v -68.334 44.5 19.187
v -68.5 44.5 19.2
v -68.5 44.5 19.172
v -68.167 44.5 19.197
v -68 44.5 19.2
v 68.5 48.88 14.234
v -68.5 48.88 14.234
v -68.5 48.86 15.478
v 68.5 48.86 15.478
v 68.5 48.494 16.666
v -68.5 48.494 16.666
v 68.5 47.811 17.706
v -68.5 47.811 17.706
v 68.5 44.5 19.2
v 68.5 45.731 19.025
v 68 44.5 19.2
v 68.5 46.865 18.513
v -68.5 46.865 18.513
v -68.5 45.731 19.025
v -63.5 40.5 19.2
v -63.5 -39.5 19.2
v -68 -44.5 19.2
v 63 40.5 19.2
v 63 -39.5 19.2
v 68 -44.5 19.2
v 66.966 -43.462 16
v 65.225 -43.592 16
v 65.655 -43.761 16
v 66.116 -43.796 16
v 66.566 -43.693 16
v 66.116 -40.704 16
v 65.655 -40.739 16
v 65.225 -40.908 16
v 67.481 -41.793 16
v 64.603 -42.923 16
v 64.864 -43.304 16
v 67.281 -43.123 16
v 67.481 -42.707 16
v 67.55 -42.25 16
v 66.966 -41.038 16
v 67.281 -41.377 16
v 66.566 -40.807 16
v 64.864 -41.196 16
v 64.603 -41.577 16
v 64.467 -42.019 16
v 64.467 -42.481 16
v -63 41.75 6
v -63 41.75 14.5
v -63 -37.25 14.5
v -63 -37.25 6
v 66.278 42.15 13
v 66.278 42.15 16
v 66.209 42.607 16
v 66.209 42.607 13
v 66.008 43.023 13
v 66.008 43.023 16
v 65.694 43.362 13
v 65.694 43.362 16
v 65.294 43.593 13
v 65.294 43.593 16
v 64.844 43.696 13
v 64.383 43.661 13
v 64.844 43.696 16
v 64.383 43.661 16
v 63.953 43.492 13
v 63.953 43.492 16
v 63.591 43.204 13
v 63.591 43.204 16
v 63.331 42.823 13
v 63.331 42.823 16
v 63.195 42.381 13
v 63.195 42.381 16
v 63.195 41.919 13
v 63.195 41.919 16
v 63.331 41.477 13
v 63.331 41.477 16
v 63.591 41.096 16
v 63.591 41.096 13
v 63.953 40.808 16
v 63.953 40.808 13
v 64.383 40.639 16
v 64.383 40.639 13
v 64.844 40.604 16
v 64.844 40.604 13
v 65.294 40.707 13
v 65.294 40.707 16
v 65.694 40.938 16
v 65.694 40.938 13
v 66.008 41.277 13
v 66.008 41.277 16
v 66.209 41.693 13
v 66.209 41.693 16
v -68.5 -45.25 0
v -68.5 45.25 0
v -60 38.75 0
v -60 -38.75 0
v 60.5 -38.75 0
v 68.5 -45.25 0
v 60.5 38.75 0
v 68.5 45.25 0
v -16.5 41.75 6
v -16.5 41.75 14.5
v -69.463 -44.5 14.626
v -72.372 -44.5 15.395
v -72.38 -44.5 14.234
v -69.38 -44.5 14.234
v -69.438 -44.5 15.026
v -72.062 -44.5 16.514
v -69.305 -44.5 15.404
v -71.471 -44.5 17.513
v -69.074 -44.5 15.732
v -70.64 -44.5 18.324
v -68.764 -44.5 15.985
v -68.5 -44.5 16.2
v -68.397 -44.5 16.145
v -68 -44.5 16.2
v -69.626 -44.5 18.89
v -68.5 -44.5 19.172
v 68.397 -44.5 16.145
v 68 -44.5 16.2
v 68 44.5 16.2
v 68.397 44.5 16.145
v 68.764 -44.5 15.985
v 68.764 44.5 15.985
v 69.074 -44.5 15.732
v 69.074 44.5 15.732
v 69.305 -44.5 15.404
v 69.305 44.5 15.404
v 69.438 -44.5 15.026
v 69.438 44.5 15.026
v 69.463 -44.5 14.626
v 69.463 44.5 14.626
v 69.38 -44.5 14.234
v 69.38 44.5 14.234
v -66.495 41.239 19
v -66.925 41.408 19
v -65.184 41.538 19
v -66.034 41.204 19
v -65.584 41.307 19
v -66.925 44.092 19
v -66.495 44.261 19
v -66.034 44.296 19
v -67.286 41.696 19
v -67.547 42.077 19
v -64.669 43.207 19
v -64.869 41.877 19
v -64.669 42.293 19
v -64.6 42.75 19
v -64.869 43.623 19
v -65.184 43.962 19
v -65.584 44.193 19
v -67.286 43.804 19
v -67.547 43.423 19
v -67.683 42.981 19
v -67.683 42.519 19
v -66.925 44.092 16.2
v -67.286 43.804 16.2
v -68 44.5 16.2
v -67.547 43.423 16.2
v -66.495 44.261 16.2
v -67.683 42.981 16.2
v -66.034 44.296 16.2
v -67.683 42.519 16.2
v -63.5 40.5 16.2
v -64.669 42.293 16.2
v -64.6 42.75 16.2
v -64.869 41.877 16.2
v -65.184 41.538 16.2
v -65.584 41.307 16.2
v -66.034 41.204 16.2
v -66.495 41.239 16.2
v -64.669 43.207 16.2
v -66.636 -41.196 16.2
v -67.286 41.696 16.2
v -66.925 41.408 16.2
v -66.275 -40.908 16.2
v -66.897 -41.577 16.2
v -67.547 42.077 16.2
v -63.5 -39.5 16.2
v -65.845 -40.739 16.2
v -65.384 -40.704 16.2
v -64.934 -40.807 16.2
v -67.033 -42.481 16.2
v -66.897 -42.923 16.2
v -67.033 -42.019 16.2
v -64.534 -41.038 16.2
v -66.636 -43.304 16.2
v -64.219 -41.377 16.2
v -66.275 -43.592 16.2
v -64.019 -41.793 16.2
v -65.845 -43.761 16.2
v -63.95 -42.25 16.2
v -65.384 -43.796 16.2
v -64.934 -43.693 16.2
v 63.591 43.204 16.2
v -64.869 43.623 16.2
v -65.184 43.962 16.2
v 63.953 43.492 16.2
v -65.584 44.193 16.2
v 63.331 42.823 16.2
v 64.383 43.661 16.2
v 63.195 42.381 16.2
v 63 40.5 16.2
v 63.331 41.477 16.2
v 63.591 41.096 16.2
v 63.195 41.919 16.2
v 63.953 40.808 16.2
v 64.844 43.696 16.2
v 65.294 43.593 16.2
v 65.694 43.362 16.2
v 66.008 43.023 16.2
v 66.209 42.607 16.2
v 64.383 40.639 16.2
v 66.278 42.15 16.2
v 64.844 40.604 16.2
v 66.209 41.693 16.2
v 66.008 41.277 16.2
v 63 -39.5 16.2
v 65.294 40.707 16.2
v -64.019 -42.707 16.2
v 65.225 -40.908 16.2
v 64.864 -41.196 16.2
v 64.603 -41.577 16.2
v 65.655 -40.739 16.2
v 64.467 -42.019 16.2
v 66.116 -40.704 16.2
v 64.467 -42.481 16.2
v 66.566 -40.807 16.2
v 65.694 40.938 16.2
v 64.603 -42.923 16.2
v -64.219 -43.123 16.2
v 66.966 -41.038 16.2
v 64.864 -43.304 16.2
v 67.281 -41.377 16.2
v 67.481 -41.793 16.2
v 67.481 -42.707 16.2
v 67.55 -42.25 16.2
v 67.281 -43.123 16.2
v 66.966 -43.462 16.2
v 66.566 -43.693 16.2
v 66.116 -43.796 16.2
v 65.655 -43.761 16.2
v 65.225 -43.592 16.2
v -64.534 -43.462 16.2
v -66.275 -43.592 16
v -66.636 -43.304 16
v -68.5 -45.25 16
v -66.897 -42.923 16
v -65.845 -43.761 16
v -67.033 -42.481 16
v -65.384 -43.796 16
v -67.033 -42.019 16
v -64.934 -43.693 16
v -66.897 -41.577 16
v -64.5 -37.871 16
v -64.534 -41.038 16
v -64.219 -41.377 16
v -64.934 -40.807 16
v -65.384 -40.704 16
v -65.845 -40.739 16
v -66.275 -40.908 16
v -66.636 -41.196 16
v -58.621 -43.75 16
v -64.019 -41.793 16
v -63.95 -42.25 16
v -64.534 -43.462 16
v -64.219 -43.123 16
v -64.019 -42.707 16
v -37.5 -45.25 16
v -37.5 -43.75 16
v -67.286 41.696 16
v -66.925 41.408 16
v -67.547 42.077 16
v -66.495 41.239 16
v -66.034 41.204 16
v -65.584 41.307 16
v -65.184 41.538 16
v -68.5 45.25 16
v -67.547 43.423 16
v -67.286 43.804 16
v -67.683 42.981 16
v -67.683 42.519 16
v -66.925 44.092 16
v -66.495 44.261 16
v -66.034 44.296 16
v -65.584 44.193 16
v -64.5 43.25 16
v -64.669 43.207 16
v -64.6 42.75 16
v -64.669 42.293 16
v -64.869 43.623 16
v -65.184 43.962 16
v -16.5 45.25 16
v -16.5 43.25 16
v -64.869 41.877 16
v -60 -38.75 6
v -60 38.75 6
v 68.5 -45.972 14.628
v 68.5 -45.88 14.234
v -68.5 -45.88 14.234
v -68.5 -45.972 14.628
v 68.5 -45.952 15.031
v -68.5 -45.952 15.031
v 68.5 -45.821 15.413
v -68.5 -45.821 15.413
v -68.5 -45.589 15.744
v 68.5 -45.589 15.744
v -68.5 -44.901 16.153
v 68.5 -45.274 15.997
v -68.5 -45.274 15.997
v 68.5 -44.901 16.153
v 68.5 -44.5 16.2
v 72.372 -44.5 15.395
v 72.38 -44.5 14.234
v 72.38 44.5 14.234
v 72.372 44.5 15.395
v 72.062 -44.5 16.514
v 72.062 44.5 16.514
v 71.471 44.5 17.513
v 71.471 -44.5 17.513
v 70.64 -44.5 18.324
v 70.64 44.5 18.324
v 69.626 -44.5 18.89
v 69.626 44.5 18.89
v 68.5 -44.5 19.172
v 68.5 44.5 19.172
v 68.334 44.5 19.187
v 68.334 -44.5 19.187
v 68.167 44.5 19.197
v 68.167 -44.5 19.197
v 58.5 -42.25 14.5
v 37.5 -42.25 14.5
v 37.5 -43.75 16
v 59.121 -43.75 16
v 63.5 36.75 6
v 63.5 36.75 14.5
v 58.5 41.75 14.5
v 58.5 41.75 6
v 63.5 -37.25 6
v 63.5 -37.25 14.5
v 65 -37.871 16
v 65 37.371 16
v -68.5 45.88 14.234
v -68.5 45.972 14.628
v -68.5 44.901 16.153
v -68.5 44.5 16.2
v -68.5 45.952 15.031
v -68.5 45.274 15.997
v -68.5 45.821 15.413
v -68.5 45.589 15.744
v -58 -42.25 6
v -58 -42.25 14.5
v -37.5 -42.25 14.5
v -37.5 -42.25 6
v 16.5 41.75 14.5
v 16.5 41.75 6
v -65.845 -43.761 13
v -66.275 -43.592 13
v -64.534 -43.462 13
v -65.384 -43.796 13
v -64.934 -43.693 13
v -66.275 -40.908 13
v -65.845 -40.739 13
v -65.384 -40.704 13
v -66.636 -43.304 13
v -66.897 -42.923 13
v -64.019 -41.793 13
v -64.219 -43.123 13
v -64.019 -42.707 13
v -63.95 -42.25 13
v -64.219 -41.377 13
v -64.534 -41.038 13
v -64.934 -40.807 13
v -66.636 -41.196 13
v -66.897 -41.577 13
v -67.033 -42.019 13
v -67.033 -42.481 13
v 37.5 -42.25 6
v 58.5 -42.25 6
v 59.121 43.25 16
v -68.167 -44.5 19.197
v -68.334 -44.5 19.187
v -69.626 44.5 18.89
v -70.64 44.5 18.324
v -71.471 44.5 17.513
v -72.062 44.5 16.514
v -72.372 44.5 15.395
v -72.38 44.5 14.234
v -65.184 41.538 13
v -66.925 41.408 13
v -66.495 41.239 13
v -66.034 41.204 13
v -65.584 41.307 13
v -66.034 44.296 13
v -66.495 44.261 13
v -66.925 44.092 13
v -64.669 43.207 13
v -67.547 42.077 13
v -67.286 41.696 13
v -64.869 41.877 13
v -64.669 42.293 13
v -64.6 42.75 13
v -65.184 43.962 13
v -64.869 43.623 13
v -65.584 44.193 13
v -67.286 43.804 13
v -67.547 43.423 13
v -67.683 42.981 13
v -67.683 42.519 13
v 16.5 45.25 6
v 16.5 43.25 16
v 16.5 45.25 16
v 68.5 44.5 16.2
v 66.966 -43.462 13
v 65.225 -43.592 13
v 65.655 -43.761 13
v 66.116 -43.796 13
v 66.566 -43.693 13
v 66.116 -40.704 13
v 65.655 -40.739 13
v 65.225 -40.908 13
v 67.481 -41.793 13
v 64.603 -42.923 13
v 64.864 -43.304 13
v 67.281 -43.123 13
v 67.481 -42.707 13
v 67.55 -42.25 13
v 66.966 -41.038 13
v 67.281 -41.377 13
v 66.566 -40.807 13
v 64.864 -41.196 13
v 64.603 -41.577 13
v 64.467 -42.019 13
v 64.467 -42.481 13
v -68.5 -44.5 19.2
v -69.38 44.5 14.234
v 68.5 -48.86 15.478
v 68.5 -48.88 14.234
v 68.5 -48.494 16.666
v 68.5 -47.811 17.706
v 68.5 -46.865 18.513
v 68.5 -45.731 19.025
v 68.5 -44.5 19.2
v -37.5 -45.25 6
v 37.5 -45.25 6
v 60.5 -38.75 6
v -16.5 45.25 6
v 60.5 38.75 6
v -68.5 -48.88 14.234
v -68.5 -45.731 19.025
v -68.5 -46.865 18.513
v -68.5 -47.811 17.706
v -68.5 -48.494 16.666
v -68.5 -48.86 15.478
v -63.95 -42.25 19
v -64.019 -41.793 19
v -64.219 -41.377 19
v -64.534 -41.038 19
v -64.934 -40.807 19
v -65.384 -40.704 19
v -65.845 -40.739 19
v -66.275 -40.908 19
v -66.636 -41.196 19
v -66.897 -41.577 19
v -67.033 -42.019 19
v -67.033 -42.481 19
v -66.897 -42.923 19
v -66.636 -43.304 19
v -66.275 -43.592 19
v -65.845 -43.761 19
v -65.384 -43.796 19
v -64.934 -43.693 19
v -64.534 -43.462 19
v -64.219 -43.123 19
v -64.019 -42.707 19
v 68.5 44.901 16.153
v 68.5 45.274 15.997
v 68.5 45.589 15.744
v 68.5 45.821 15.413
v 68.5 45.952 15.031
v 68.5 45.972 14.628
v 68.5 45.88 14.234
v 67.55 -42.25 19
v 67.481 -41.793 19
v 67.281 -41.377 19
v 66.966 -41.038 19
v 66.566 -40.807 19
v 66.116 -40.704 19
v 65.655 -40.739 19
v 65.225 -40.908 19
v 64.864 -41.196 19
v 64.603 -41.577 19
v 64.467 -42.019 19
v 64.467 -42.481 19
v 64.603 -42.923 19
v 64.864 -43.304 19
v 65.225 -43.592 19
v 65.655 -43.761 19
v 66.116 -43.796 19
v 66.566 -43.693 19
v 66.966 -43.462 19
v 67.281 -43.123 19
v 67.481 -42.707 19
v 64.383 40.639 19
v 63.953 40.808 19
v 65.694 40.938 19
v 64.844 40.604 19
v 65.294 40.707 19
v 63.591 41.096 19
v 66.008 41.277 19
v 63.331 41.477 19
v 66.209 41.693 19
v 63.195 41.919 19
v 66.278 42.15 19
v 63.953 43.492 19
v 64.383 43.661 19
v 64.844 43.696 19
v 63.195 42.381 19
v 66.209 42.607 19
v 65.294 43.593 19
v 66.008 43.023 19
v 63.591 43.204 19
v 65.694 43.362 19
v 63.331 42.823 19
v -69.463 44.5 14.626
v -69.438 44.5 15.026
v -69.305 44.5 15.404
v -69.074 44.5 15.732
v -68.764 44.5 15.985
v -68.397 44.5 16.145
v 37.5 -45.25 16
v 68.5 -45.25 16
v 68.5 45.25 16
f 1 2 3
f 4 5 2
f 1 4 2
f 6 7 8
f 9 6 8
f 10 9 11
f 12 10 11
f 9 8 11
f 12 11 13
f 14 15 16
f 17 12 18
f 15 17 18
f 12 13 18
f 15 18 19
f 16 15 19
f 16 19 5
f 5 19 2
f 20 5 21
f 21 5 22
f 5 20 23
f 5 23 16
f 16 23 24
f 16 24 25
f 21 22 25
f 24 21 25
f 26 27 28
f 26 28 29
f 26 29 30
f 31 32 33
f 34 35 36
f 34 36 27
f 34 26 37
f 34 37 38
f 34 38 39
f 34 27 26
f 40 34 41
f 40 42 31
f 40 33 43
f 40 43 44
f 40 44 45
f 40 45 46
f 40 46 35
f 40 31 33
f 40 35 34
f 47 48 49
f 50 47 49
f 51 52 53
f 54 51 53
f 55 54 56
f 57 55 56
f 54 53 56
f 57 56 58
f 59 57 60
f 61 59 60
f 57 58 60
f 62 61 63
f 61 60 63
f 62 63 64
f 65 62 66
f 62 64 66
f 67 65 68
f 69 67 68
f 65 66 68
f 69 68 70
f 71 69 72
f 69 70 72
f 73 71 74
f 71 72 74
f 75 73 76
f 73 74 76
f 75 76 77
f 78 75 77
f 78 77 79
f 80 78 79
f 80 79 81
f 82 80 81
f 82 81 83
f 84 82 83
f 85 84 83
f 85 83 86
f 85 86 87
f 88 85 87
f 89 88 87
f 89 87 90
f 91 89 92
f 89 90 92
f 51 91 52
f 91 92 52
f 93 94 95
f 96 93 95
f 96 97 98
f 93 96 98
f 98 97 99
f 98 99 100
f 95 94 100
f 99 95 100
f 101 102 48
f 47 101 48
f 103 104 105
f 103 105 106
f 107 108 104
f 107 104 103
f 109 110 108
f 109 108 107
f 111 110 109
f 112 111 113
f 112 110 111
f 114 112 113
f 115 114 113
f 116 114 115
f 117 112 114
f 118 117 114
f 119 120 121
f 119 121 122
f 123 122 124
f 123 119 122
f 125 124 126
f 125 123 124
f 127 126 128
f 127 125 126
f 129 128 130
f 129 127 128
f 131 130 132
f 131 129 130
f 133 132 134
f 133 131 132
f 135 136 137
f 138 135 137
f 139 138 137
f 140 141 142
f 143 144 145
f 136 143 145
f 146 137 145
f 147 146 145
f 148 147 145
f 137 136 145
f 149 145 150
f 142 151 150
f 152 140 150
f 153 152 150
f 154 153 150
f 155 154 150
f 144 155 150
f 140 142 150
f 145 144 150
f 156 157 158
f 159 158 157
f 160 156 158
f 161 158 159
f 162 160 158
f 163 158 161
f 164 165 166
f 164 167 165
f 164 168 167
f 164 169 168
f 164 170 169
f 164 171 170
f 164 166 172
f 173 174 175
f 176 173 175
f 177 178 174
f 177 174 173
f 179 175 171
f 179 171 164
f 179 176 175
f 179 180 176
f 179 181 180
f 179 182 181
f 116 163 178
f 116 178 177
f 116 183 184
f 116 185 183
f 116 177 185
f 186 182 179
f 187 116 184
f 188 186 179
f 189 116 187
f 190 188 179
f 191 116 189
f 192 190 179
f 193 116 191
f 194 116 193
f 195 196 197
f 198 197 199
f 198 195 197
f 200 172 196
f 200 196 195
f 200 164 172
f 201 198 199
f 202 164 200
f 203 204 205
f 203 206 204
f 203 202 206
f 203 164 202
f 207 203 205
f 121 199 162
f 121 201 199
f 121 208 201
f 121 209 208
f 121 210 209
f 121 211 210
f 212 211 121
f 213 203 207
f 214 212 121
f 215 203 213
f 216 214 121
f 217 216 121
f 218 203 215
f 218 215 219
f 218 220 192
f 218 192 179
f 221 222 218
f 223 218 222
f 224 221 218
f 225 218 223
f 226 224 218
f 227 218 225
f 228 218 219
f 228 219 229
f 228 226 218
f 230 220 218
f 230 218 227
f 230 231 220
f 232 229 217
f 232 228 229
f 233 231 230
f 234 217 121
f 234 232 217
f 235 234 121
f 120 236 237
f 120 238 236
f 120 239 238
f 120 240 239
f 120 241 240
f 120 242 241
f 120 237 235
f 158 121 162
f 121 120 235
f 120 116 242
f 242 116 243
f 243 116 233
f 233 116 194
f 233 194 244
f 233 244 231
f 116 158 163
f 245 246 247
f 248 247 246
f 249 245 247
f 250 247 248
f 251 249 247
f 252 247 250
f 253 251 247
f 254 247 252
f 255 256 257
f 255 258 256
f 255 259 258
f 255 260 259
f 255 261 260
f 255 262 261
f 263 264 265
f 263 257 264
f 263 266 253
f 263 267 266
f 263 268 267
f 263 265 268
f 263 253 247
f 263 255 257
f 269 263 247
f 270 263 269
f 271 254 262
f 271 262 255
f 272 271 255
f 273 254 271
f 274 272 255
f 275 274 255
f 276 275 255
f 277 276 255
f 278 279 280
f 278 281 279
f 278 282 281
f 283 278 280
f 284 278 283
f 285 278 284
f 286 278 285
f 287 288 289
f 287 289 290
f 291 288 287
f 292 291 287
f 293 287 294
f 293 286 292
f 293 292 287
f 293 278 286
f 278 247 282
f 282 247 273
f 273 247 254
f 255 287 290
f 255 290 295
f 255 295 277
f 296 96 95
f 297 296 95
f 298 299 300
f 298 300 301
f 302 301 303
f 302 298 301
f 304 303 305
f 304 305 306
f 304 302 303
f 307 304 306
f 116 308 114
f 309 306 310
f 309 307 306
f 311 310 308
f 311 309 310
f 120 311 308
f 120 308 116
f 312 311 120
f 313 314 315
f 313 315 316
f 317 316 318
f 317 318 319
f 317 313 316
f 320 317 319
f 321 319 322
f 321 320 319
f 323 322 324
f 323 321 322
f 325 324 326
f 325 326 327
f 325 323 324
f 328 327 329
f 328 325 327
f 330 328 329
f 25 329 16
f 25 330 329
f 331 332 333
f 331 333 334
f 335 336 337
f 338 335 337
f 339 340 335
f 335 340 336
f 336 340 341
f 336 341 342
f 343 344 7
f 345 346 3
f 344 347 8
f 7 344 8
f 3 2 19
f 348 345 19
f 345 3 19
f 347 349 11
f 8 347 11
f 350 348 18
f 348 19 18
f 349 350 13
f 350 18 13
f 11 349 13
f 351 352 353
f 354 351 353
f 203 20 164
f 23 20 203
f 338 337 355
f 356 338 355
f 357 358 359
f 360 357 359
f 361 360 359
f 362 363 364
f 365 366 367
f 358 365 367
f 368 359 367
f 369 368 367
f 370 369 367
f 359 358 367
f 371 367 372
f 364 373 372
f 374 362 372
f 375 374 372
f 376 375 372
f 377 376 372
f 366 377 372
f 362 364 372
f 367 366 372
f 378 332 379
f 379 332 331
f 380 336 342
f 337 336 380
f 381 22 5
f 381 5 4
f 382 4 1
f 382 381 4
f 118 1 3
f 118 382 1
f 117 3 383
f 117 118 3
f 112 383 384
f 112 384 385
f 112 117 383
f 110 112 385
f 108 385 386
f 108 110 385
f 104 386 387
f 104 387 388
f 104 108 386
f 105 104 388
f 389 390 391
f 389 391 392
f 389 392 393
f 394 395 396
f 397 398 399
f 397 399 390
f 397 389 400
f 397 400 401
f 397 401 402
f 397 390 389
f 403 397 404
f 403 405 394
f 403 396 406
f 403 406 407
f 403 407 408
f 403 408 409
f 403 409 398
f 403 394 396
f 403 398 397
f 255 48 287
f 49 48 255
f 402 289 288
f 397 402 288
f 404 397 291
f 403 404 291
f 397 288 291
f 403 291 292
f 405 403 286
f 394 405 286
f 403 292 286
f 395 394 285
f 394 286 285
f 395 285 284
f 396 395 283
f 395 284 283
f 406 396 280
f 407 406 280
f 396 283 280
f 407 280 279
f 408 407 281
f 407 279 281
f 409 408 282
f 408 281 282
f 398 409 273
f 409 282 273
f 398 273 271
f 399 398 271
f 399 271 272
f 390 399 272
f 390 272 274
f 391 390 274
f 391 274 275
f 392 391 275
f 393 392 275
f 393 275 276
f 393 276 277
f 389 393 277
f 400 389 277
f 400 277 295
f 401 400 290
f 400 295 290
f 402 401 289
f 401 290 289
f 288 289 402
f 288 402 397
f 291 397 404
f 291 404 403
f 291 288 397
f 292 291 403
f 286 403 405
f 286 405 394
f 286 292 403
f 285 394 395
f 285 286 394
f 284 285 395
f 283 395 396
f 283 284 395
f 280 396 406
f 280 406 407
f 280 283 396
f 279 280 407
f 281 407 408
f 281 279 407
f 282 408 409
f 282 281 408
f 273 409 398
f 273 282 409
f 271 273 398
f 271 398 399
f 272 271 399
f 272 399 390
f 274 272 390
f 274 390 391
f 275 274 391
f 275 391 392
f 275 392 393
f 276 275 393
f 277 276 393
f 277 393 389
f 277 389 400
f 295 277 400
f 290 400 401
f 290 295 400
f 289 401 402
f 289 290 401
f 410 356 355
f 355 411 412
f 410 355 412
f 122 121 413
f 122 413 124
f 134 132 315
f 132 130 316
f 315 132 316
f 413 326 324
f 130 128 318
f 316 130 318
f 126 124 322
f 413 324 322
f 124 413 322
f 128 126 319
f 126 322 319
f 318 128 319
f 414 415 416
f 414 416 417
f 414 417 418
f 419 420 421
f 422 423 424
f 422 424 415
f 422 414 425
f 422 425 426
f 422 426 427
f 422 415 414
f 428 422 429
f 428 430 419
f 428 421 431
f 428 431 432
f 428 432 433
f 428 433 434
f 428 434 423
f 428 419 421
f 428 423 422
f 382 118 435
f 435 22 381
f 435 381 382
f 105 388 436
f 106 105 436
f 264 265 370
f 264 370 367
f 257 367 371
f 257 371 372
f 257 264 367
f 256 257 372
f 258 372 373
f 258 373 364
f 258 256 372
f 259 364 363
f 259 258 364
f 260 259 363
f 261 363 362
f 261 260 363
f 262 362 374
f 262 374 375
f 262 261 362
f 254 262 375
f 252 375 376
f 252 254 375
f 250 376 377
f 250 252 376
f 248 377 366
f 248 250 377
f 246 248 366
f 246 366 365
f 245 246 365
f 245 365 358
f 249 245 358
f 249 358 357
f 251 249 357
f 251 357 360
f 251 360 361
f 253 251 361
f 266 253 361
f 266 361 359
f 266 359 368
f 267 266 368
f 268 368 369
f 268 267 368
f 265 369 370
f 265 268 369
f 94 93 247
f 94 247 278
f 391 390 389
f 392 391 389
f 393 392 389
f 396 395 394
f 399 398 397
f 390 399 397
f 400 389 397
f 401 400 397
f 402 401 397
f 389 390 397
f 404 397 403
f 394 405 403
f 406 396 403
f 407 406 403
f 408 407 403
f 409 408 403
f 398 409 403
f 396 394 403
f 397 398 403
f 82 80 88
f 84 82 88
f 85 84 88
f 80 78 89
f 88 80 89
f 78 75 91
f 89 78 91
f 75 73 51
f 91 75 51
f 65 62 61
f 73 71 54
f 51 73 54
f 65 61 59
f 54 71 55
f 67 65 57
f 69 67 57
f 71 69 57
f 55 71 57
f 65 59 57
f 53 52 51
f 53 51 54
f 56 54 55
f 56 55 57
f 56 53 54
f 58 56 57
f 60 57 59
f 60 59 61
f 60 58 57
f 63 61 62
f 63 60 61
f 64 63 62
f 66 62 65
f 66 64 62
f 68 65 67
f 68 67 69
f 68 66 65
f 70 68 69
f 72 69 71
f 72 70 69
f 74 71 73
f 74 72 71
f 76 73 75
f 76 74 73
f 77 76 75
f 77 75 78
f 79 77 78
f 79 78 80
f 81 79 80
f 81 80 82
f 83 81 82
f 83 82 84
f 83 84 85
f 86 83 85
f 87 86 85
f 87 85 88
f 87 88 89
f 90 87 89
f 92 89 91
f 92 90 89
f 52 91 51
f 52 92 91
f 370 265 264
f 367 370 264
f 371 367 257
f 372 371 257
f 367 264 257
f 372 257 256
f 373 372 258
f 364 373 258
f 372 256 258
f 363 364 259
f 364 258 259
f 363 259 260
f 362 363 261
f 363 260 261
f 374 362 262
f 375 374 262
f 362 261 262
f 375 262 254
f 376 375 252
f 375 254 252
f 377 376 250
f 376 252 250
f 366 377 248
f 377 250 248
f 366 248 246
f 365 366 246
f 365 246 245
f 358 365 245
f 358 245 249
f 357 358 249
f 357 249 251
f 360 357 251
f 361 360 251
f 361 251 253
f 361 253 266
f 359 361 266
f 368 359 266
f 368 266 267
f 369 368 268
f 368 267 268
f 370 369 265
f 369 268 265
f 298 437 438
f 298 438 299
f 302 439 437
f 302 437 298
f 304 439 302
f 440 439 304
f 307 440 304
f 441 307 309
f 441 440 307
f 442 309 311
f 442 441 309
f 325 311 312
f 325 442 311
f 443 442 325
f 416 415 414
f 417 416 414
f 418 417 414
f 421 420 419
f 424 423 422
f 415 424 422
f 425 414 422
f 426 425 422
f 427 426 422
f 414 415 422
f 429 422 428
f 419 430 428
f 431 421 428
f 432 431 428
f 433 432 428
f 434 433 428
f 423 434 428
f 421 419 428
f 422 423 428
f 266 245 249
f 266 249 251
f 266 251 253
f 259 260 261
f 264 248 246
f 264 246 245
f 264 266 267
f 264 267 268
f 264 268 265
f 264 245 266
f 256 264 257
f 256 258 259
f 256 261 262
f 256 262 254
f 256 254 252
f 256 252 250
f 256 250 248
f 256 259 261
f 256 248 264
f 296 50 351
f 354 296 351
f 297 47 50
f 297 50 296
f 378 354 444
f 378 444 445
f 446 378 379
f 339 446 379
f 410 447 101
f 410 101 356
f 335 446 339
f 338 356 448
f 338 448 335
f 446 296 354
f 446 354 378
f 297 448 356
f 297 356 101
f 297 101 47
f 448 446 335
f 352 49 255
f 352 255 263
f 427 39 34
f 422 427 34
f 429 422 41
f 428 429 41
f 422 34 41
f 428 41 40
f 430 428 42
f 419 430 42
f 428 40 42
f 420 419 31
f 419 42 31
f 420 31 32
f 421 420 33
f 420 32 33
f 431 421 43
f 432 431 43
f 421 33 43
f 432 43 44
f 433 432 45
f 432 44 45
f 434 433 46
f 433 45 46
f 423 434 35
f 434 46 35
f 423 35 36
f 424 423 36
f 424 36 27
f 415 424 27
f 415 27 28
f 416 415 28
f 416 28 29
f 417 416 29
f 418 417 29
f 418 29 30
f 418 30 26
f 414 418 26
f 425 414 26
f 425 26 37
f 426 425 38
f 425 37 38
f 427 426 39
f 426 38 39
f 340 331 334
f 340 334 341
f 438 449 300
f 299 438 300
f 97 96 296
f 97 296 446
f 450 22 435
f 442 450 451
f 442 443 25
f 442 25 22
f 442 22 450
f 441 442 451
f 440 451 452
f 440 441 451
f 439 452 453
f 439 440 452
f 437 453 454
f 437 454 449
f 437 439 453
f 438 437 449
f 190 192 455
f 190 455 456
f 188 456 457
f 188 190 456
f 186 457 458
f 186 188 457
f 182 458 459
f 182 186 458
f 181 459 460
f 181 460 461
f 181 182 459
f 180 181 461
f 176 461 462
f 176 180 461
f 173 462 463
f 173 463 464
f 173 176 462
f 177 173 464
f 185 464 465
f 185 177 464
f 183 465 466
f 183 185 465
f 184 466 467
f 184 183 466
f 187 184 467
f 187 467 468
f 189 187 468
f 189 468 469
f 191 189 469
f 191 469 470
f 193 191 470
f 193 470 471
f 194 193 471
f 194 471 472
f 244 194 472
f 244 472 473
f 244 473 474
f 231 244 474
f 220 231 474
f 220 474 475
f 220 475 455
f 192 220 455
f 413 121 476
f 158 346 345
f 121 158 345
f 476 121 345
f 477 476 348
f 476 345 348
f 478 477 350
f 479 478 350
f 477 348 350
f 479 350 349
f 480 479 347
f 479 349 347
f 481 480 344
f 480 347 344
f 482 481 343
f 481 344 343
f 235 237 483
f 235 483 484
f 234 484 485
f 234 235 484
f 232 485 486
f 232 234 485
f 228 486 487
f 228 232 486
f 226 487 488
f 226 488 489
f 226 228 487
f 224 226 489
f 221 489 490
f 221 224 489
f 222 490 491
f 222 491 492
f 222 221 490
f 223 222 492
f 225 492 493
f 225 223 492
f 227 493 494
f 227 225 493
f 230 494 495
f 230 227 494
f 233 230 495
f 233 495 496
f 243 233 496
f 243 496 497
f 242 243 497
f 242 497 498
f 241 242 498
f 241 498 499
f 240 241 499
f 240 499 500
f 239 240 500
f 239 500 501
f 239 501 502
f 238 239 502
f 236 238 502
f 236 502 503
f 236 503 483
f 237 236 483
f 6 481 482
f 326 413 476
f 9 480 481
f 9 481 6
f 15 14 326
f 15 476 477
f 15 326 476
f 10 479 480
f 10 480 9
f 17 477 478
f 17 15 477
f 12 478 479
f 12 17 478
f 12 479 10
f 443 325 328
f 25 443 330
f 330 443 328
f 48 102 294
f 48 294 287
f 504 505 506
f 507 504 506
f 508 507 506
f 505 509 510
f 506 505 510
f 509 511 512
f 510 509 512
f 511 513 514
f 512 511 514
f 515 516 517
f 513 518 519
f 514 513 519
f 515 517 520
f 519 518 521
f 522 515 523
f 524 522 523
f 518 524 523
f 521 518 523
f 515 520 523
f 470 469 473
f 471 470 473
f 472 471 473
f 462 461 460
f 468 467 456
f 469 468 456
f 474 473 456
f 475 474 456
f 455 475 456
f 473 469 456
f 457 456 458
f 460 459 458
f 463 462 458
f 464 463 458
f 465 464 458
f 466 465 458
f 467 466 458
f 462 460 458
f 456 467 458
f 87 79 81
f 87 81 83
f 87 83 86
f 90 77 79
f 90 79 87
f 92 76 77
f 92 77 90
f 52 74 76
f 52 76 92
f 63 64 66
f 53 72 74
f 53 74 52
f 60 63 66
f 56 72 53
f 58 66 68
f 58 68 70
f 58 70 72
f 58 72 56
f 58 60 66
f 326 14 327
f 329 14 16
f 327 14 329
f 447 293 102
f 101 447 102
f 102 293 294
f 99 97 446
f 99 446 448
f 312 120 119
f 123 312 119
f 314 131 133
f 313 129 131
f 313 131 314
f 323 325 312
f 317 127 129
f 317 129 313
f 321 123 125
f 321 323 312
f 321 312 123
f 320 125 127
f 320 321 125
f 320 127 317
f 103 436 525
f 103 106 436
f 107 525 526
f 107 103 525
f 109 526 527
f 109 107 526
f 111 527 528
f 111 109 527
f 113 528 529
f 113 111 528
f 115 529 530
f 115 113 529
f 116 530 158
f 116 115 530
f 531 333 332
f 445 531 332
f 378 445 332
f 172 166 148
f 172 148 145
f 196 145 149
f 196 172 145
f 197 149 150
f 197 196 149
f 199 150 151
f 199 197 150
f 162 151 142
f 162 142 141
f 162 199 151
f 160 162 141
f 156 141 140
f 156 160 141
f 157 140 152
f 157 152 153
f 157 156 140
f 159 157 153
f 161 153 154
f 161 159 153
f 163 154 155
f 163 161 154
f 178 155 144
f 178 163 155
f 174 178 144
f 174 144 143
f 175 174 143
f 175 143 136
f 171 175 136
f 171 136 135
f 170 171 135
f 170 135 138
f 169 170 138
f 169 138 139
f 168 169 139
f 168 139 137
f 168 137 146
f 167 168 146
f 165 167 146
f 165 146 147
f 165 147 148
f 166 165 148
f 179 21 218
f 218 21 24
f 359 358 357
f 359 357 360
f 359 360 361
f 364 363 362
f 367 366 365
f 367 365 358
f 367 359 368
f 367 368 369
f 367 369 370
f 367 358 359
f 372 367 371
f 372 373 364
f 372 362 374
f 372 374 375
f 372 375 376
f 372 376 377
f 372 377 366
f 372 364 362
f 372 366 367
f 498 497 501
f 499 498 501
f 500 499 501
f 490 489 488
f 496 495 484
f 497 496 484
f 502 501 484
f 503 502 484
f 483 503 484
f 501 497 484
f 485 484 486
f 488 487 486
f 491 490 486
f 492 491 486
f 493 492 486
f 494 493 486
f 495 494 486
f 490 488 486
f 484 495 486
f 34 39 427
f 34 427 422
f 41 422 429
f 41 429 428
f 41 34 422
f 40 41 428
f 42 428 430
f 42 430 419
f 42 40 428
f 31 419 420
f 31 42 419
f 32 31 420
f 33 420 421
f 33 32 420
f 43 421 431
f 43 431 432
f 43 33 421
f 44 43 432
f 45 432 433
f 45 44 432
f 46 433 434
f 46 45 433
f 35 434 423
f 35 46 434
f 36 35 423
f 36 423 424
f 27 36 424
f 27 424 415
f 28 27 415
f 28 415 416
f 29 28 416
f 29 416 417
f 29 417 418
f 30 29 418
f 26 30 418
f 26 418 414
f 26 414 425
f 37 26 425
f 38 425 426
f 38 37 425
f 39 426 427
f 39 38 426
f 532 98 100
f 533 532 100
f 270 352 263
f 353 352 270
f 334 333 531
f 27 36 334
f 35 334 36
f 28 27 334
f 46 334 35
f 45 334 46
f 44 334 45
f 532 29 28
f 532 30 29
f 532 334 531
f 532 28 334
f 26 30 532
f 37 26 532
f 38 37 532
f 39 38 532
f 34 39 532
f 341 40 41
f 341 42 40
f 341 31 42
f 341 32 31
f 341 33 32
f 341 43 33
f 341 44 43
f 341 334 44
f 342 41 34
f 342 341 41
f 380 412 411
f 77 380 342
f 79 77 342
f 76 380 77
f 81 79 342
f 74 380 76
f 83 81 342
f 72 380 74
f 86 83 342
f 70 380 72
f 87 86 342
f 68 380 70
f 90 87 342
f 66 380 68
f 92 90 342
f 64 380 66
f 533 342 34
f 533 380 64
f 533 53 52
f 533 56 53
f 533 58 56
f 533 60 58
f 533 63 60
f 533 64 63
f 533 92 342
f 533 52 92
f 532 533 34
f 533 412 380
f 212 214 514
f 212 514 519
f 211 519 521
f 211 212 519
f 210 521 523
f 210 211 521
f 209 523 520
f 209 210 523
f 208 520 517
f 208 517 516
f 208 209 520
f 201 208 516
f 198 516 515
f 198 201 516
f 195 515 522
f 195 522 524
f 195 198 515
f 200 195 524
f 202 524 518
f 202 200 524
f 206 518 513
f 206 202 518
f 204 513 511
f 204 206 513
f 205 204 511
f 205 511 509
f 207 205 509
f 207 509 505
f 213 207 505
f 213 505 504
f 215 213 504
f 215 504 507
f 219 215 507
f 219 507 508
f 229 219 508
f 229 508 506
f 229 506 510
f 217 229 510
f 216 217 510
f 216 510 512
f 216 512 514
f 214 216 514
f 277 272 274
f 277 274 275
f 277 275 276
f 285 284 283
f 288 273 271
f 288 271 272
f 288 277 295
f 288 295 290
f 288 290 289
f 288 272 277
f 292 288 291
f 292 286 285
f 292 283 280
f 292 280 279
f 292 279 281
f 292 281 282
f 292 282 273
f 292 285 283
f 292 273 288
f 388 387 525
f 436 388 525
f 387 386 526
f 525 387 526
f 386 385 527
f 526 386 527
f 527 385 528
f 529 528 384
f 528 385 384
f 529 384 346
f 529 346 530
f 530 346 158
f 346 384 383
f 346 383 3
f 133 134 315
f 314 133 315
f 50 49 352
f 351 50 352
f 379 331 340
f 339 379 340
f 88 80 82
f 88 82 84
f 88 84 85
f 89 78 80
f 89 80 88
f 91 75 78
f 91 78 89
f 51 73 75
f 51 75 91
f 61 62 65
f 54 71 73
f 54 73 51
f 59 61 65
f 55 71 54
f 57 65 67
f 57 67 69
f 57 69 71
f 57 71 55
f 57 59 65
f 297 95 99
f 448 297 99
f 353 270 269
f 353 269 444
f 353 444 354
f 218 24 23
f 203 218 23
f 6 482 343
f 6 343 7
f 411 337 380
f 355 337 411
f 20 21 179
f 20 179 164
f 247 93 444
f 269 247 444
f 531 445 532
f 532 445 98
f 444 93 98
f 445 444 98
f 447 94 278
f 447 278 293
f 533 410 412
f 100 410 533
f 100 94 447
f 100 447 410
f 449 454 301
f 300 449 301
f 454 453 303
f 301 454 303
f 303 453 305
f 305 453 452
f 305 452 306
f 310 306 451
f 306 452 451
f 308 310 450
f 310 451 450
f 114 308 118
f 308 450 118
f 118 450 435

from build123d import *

# Parameters (mm, degrees)
F0_W      = 137
F0_H      = 90.5
F0_W_2    = 120.5
F0_H_2    = 77.5
F1_DEPTH  = 16
F3_W      = 33
F3_H      = 39.131847919
F3_H_2    = 13
F3_W_2    = 75
F3_H_3    = 13.5
F3_H_4    = 6.5
F4_DEPTH  = 10
F5_SIZE   = 1.5
F6_R      = 1.55
F7_DEPTH  = 3
F8_DEPTH  = 3
F9_W      = 136
F9_H      = 3
F10_DEPTH = 44.5
F12_DEPTH = 68.5
F13_W     = 126.5
F13_H     = 80
F14_DEPTH = 10
F15_DEPTH = 3


# Not quite as in the source:
# - a feature names something its author has since deleted; it is built from what else it names


with BuildPart() as f1:
    # F0 (on Top) → F1 (new body)
    with BuildSketch(Plane.XY):
        Rectangle(F0_W, F0_H)
        with Locations((0.25, 0)):
            Rectangle(F0_W_2, F0_H_2, mode=Mode.SUBTRACT)
    extrude(amount=F1_DEPTH)

    # F3 (on 3pt) → F4 (cut)
    with BuildSketch(Plane.XY.offset(16)):
        with Locations((0, 61.3159239595)):
            Rectangle(F3_W, F3_H)
        with Locations((0, 35.25)):
            Rectangle(F3_W, F3_H_2)
        Polygon((-16.5, 28.75), (-16.5, 41.75), (-63, 41.75), (-63, -37.25), (-58, -42.25), (-37.5, -42.25), (-37.5, -28.75), (37.5, -28.75), (37.5, -42.25), (58.5, -42.25), (63.5, -37.25), (63.5, 36.75), (58.5, 41.75), (16.5, 41.75), (16.5, 28.75), align=None)
        with Locations((0, -35.5)):
            Rectangle(F3_W_2, F3_H_3)
        with Locations((0, -45.5)):
            Rectangle(F3_W_2, F3_H_4)
    extrude(amount=-F4_DEPTH, mode=Mode.SUBTRACT)

    # F5
    f5_edges = [f1.edges().sort_by_distance(p)[0] for p in [
        (-63, 2.25, 16),
        (-39.75, 41.75, 16),
        (61, 39.25, 16),
        (63.5, -0.25, 16),
        (61, -39.75, 16),
        (-60.5, -39.75, 16),
        (-47.75, -42.25, 16),
        (48, -42.25, 16),
        (37.5, 41.75, 16),
    ]]
    chamfer(f5_edges, length=F5_SIZE)

    # F6 (on face) → F7 (cut)
    with BuildSketch(Plane.XY.offset(16)):
        with Locations((-66.15, 42.75)):
            Circle(F6_R)
        with Locations((-65.5, -42.25)):
            Circle(F6_R)
        with Locations((66, -42.25)):
            Circle(F6_R)
        with Locations((64.7276754423, 42.15)):
            Circle(F6_R)
    extrude(amount=-F7_DEPTH, mode=Mode.SUBTRACT)


with BuildPart() as f8:
    # F6 (on face) → F8 (new body)
    with BuildSketch(Plane.XY.offset(16)):
        with Locations((-66.15, 42.75)):
            Circle(F6_R)
    extrude(amount=-F8_DEPTH)


with BuildPart() as f8b:
    # F6 (on face) → F8, piece 2 (new body)
    with BuildSketch(Plane.XY.offset(16)):
        with Locations((-65.5, -42.25)):
            Circle(F6_R)
    extrude(amount=-F8_DEPTH)


with BuildPart() as f8c:
    # F6 (on face) → F8, piece 3 (new body)
    with BuildSketch(Plane.XY.offset(16)):
        with Locations((66, -42.25)):
            Circle(F6_R)
    extrude(amount=-F8_DEPTH)


with BuildPart() as f8d:
    # F6 (on face) → F8, piece 4 (new body)
    with BuildSketch(Plane.XY.offset(16)):
        with Locations((64.7276754423, 42.15)):
            Circle(F6_R)
    extrude(amount=-F8_DEPTH)


with BuildPart() as f10:
    # F9 (on Front) → F10 (new body, symmetric)
    with BuildSketch(Plane.XZ):
        with Locations((0, 17.7)):
            Rectangle(F9_W, F9_H)
        with BuildLine():
            Line((-68, 16.2), (-68, 19.2))
            ThreePointArc((-68, 19.2), (-71.3106094408, 17.7056160116), (-72.3797211221, 14.2342591319))
            Line((-72.3797211221, 14.2342591319), (-69.3797211221, 14.2342591319))
            ThreePointArc((-69.3797211221, 14.2342591319), (-69.2008088457, 15.575755747), (-68, 16.2))
        make_face()
        with BuildLine():
            ThreePointArc((72.3797211221, 14.2342591319), (71.3106094408, 17.7056160116), (68, 19.2))
            Line((68, 19.2), (68, 16.2))
            ThreePointArc((68, 16.2), (69.2008088457, 15.575755747), (69.3797211221, 14.2342591319))
            Line((69.3797211221, 14.2342591319), (72.3797211221, 14.2342591319))
        make_face()
    extrude(amount=F10_DEPTH, both=True)

    # F11 (on Right) → F12 (join, symmetric)
    with BuildSketch(Plane.YZ):
        with BuildLine():
            ThreePointArc((48.8797211221, 14.2342591319), (47.8106094408, 17.7056160116), (44.5, 19.2))
            Line((44.5, 19.2), (44.5, 16.2))
            ThreePointArc((44.5, 16.2), (45.7165581841, 15.5868099481), (45.8797211221, 14.2342591319))
            Line((45.8797211221, 14.2342591319), (48.8797211221, 14.2342591319))
        make_face()
        with BuildLine():
            ThreePointArc((-44.5, 19.2), (-47.8106094408, 17.7056160116), (-48.8797211221, 14.2342591319))
            Line((-48.8797211221, 14.2342591319), (-45.8797211221, 14.2342591319))
            ThreePointArc((-45.8797211221, 14.2342591319), (-45.7165581841, 15.5868099481), (-44.5, 16.2))
            Line((-44.5, 16.2), (-44.5, 19.2))
        make_face()
    extrude(amount=F12_DEPTH, both=True)

    # F13 (on face) → F14 (cut)
    with BuildSketch(Plane.XY.offset(19.2)):
        with Locations((-0.25, 0.5)):
            Rectangle(F13_W, F13_H)
    extrude(amount=-F14_DEPTH, mode=Mode.SUBTRACT)

    # F6 (on face) → F15 (cut)
    with BuildSketch(Plane.XY.offset(16)):
        with Locations((-66.15, 42.75)):
            Circle(F6_R)
        with Locations((-65.5, -42.25)):
            Circle(F6_R)
        with Locations((66, -42.25)):
            Circle(F6_R)
        with Locations((64.7276754423, 42.15)):
            Circle(F6_R)
    extrude(amount=F15_DEPTH, mode=Mode.SUBTRACT)


solid = Compound([f1.part, f8.part, f8b.part, f8c.part, f8d.part, f10.part])
